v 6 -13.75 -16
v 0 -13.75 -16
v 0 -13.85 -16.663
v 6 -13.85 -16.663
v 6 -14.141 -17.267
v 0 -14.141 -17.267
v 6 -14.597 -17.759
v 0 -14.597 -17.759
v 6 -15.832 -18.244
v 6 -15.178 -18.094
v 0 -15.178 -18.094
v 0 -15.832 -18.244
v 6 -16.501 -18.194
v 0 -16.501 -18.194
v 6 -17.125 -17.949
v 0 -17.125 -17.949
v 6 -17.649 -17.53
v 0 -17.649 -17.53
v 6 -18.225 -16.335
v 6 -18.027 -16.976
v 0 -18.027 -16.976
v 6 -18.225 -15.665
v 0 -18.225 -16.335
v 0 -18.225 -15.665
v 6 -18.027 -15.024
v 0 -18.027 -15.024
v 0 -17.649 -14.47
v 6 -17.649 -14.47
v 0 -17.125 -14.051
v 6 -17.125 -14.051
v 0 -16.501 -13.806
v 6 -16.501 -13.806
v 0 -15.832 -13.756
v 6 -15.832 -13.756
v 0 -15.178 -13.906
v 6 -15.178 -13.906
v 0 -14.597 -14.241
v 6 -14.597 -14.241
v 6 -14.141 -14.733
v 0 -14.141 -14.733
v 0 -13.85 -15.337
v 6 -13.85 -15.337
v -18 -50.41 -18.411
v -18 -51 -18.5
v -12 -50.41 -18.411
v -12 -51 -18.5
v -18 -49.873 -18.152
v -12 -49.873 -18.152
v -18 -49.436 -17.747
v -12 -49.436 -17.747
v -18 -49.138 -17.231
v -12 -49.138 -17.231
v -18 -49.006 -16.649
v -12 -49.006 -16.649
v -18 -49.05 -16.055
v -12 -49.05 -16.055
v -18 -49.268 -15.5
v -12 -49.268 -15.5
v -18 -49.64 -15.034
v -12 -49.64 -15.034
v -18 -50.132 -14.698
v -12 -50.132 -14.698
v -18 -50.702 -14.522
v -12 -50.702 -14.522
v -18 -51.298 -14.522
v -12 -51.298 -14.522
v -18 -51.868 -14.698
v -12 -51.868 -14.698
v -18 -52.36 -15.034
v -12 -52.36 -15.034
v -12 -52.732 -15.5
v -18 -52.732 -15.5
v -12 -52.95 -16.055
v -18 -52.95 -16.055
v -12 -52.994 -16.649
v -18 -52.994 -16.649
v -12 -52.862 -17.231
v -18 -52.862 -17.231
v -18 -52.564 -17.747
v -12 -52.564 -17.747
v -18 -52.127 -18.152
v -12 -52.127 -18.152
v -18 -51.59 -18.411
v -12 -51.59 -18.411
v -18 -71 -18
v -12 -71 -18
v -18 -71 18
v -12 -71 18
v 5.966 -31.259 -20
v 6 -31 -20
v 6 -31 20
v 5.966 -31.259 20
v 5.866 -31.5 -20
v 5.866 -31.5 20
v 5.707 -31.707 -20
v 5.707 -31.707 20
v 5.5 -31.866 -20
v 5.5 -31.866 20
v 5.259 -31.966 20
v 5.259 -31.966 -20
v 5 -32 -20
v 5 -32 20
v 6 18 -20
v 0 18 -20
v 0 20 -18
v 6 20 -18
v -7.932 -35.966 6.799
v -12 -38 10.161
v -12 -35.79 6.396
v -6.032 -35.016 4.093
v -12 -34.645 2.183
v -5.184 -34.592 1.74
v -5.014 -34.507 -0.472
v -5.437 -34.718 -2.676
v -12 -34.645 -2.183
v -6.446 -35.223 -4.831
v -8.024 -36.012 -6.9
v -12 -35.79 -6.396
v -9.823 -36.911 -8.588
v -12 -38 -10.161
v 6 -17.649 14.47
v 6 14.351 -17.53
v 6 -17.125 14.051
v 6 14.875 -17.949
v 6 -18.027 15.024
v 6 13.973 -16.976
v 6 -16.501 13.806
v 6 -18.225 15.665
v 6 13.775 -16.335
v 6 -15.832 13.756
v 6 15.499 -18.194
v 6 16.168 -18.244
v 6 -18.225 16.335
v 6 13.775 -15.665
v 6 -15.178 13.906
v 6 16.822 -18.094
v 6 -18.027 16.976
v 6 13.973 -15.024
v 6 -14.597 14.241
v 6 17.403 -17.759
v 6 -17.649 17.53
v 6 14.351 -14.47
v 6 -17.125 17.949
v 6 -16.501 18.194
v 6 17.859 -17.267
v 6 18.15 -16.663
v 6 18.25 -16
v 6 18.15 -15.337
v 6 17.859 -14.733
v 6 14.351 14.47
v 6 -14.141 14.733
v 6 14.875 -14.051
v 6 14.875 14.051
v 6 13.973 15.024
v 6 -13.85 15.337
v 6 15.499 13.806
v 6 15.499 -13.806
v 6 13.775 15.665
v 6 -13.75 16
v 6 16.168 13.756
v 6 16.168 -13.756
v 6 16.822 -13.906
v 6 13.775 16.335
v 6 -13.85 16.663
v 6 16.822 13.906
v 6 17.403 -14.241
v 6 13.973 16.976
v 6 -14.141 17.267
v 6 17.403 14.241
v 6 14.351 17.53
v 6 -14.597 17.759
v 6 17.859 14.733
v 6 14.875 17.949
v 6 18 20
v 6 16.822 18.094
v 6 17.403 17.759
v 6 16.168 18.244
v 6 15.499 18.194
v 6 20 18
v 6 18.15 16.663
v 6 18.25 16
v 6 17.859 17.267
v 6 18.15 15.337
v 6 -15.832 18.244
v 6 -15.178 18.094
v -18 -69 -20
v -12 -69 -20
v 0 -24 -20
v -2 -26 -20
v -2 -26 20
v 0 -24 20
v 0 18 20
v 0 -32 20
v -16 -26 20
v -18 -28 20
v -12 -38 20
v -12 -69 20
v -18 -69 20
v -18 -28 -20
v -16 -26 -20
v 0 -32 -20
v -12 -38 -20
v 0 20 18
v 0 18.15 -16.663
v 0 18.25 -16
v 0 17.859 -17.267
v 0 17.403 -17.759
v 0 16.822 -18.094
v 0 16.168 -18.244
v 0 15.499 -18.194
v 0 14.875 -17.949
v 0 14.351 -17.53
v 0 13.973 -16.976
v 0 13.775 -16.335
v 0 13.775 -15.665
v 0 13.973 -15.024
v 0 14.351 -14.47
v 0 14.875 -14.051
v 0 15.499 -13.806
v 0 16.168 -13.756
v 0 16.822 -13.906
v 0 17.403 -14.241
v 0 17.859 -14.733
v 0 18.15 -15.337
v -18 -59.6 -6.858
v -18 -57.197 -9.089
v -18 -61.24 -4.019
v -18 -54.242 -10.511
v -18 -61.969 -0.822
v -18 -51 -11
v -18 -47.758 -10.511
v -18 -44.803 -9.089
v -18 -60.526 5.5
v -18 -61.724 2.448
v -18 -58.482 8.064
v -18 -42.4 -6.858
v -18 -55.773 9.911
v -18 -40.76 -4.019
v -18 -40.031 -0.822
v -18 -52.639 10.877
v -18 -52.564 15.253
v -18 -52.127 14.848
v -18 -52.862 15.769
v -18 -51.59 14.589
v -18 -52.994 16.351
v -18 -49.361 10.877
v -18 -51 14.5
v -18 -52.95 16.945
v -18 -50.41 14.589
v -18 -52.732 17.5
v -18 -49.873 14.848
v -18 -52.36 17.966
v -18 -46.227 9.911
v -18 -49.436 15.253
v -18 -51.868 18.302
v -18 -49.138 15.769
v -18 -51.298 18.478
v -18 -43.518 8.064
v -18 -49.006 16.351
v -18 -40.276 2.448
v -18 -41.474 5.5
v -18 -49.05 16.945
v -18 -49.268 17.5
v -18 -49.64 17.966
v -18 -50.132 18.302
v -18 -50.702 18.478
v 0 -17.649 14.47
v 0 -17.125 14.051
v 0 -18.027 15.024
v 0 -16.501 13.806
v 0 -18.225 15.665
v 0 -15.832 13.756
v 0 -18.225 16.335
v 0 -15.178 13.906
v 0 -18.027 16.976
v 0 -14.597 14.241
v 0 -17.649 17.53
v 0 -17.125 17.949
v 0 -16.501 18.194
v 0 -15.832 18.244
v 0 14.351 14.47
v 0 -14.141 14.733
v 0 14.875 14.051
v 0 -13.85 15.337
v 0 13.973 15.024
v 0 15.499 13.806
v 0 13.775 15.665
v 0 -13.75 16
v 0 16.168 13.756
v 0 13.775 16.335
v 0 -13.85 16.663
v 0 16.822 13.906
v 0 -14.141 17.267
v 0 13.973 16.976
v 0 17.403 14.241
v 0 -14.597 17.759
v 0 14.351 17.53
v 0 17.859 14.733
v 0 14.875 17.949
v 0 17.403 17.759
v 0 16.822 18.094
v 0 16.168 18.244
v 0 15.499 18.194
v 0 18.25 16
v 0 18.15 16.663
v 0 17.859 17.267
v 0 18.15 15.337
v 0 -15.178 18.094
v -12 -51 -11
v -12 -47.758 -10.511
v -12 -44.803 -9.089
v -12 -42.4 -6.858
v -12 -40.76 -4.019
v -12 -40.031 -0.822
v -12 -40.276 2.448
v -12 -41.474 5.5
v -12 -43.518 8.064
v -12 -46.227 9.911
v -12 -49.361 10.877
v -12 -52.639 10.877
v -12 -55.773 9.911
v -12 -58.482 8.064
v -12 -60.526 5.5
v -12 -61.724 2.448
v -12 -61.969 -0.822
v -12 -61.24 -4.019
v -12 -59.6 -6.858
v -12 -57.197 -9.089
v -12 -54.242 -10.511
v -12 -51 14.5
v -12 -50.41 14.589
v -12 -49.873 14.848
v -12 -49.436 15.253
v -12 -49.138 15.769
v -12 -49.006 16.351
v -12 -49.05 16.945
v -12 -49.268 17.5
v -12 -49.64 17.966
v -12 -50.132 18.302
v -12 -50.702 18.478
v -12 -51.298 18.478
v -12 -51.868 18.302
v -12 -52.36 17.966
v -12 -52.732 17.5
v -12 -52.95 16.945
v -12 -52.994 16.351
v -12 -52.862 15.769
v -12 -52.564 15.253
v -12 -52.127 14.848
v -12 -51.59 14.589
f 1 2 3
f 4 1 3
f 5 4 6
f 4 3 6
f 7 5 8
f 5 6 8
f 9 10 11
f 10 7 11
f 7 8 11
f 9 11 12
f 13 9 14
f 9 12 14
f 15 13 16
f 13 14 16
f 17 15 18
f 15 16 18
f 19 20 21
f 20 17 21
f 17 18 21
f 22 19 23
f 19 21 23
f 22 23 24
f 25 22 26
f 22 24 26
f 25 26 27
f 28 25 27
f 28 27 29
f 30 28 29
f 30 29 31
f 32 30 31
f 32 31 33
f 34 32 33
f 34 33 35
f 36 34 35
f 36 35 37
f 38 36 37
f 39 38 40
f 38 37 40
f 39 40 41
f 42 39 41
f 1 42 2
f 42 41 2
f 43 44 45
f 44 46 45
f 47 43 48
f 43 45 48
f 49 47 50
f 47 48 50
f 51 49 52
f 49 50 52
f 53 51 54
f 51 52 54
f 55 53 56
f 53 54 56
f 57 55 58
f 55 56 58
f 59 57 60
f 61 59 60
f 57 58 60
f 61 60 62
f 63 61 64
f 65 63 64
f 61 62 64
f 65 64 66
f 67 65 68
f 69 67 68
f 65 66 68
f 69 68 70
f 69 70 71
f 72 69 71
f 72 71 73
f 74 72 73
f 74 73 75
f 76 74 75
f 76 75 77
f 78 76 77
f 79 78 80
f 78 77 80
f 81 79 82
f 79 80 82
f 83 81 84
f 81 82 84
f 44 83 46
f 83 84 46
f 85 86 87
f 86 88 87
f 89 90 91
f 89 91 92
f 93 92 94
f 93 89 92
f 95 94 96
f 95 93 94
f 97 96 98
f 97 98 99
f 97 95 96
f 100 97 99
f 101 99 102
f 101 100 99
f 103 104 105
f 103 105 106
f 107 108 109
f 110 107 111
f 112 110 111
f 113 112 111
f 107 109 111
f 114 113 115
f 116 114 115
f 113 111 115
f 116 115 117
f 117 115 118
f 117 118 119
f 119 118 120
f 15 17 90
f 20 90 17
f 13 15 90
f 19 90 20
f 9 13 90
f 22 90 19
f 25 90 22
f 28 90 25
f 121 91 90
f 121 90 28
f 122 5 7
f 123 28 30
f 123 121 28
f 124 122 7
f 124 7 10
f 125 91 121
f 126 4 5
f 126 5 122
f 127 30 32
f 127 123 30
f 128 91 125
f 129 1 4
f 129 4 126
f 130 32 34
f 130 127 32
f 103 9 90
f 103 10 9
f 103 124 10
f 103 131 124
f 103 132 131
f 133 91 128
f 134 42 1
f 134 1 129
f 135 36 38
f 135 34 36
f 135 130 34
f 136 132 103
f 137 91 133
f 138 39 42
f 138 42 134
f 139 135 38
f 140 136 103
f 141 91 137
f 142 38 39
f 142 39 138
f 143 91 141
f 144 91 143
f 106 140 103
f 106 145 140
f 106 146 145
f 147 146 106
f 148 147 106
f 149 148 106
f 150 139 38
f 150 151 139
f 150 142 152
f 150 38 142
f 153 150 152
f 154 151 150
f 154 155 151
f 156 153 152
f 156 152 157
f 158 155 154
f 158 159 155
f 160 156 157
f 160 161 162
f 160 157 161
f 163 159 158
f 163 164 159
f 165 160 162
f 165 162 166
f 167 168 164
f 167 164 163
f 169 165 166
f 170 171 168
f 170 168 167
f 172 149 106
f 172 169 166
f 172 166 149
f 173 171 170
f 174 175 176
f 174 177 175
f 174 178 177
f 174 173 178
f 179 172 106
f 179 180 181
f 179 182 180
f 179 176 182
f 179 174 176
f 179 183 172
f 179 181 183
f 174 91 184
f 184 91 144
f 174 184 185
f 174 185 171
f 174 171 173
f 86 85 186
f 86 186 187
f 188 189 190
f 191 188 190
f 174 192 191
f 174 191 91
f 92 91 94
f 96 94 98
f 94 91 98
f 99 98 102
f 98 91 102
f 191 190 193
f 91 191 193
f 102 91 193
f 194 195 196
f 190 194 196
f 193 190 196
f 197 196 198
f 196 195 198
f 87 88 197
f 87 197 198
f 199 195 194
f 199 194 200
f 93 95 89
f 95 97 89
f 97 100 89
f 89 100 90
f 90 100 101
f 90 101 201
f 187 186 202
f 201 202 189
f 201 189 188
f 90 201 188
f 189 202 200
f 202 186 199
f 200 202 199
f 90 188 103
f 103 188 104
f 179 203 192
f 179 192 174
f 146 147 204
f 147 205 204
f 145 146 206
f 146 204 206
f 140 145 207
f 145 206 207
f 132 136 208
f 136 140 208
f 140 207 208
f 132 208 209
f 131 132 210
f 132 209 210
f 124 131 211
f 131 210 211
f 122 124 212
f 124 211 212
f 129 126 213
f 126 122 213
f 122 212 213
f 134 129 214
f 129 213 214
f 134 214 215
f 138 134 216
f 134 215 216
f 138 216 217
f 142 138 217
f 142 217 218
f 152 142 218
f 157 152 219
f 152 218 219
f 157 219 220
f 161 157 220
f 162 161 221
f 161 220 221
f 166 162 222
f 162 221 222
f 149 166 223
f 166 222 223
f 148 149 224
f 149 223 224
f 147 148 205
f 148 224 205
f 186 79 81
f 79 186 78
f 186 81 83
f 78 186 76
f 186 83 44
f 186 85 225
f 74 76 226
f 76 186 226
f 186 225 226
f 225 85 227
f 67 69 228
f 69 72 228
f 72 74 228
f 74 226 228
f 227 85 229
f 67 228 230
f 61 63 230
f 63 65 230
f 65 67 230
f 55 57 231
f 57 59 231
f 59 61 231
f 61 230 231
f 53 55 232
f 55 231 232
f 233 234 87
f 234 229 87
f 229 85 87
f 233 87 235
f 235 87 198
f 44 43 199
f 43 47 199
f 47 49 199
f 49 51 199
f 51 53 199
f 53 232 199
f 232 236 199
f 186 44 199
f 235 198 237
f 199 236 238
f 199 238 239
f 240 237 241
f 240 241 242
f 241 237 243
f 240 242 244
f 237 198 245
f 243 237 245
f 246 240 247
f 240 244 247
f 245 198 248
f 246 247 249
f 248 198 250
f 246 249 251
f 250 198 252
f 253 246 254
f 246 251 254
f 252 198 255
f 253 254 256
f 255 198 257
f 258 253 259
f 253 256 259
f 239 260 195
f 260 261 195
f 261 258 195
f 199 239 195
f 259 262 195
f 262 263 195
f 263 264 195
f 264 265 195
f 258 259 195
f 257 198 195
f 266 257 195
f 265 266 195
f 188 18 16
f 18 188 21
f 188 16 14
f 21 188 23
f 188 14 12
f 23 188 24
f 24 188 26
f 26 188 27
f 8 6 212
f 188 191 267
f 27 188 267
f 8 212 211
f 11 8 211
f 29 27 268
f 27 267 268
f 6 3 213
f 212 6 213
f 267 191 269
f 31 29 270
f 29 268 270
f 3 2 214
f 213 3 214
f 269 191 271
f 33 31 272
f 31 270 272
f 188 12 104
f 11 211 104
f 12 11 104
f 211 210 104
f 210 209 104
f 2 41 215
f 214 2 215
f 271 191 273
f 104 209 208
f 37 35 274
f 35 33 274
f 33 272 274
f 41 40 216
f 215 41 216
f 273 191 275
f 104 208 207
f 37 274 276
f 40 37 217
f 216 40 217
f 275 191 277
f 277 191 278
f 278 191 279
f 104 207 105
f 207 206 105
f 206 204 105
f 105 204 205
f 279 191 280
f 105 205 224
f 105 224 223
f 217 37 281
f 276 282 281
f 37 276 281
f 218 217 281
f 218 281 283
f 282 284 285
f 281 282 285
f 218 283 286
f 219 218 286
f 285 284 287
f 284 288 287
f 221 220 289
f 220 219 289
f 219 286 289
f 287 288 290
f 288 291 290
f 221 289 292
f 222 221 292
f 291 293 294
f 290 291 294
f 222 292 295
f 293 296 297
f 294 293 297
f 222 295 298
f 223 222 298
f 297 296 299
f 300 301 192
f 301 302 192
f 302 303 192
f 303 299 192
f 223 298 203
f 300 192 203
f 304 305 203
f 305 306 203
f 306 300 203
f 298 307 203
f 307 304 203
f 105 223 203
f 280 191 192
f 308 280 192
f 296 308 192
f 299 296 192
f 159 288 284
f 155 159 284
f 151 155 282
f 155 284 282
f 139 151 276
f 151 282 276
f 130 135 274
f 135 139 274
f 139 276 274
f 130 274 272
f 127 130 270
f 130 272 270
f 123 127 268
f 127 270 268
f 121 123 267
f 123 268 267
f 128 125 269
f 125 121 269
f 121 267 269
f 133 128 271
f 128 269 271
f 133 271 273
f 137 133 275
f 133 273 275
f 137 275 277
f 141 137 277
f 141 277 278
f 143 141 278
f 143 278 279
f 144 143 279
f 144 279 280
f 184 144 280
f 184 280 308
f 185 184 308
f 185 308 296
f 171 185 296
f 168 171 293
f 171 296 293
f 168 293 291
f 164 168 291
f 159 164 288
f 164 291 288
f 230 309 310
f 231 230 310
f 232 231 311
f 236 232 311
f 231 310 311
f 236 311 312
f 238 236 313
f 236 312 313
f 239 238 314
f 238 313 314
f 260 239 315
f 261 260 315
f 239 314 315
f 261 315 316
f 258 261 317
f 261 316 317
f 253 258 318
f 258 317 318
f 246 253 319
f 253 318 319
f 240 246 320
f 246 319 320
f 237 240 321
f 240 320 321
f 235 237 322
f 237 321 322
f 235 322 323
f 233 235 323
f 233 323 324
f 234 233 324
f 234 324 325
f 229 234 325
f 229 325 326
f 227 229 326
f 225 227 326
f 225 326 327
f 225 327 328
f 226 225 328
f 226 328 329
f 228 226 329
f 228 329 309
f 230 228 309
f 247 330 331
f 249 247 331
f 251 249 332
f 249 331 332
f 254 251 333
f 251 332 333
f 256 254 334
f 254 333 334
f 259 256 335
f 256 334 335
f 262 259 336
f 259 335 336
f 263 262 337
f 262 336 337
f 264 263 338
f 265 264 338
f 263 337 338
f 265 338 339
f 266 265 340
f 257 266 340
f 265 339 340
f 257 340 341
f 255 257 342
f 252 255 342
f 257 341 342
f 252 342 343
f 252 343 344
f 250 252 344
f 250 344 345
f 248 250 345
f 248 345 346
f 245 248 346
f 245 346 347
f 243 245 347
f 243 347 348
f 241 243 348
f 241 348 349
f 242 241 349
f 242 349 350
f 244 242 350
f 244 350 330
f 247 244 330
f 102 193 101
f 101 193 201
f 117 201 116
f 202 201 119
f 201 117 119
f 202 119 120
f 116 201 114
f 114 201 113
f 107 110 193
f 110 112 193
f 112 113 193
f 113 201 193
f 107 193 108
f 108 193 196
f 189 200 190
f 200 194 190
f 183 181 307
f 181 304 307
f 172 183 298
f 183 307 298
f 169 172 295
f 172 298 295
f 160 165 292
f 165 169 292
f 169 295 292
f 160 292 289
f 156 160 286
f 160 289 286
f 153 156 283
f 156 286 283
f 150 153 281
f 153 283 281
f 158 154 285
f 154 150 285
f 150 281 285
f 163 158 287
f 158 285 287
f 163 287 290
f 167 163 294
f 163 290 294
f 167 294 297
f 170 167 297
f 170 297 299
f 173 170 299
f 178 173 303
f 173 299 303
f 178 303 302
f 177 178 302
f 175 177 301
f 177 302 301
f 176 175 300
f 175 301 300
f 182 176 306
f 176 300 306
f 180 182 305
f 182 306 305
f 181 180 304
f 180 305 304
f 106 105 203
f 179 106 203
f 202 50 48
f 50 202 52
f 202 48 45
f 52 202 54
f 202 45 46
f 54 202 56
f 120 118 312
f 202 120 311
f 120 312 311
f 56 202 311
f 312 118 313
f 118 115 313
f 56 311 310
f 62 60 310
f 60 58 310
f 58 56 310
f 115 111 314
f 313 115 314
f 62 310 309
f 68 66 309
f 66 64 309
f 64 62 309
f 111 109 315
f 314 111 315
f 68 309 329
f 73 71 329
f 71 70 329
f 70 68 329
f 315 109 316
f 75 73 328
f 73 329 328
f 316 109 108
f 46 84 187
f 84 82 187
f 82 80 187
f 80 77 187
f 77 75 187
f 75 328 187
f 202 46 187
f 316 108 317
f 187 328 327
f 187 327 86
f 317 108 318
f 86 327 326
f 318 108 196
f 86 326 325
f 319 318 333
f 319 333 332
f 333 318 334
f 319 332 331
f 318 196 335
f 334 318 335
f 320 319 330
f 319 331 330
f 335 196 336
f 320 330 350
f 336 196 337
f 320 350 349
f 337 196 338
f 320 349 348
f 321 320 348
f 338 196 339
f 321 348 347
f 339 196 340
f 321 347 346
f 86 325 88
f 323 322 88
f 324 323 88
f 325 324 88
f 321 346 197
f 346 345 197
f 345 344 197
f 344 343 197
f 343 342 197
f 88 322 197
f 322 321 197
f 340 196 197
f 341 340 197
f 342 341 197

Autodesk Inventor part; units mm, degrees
ref_plane "YZ Plane" through (0, 0, 0) normal (1, 0, 0) x (0, 1, 0)
ref_plane "XZ Plane" through (0, 0, 0) normal (0, 1, 0) x (-1, 0, 0)
ref_plane "XY Plane" through (0, 0, 0) normal (0, 0, 1) x (1, 0, 0)
sketch "Skizze1" plane through (0, 0, 0) normal (1, 0, 0) x (0, 1, 0)
  line L0 (-20, -20) -> (20, -20)
  line L1 (20, -20) -> (20, 20)
  line L2 (20, 20) -> (-20, 20)
  line L3 (-20, 20) -> (-20, -20)
  line L4 (-20, -20) -> (20, 20) construction
  line L5 (20, -20) -> (-20, 20) construction
  line L6 (-16, -16) -> (16, -16) construction
  line L7 (16, -16) -> (16, 16) construction
  line L8 (16, 16) -> (-16, 16) construction
  line L9 (-16, 16) -> (-16, -16) construction
  line L10 (-16, -16) -> (16, 16) construction
  line L11 (16, -16) -> (-16, 16) construction
  circle A0 centre (16, 16) radius 2.25
  circle A1 centre (16, -16) radius 2.25
  circle A2 centre (-16, -16) radius 2.25
  circle A3 centre (-16, 16) radius 2.25
  line L12 (-20, 20) -> (-32, 20)
  line L13 (-32, 20) -> (-32, -20)
  line L14 (-32, -20) -> (-20, -20)
  line L15 (-20, -20) -> (-20, 20)
  point P0 (0, 0)
  dimension "d0" = 40
  dimension "d1" = 40
  dimension "d2" = 32
  dimension "d3" = 32
  dimension "d4" = 4.5
  dimension "d5" = 4.5
  dimension "d6" = 4.5
  dimension "d7" = 4.5
  dimension "d8" = 12
extrude "Extrusion1" add sketch "Skizze1" along normal blind 6
ref_plane "Arbeitsebene1" through (0, -32, 20) normal (0, 0, 1) x (1, 0, 0)
sketch "Skizze2" plane through (0, -32, 20) normal (0, 0, 1) x (1, 0, 0)
  line L0 (0, 52) -> (0, 0) projected
  line L1 (0, 0) -> (6, 0) projected
  line L2 (6, 52) -> (6, 0) projected
  line L3 (0, 52) -> (6, 52) projected
  line L4 (-18, 6) -> (-12, 6)
  line L5 (-12, 6) -> (-12, -39)
  line L6 (-12, -39) -> (-18, -39)
  line L7 (-18, -39) -> (-18, 6)
  line L8 (0, 0) -> (-12, -6)
  line L9 (-12, 6) -> (0, 6)
  point P0 (0, 32)
  point P1 (-15, -39)
  point P2 (-15, 6)
  dimension "d12" = 6
  dimension "d13" = 45
  dimension "d14" = 6
  dimension "d15" = 12
  dimension "d16" = 12
extrude "Extrusion2" add sketch "Skizze2" against normal up to surface (40 mm away) contours L0 L8 L5 L9 | L5 L6 L7 L4
chamfer "Fasen1" distance 2 angle 45 6 edges at (-18, -26, 0) (0, -26, 0) (-15, -71, -20) (-15, -71, 20) (3, 20, -20) (3, 20, 20)
sketch "Skizze3" plane through (-12, -38, 20) normal (1, 0, 0) x (0, 0, -1)
  line L0 (2, -33) -> (0, -31) projected
  line L1 (2, -33) -> (38, -33) projected
  line L2 (40, -31) -> (38, -33) projected
  line L3 (40, 0) -> (40, -31) projected
  line L4 (0, 0) -> (40, 0) projected
  line L5 (0, -31) -> (0, 0) projected
  circle A0 centre (20, -13) radius 20
  circle A1 centre (20, -13) radius 16.5
  point P0 (20, 38)
  dimension "d22" = 33
extrude "Extrusion3" cut sketch "Skizze3" along normal through all contours A1 L4 | L4 A1
sketch "Skizze4" plane through (-12, -69, 20) normal (1, 0, 0) x (0, 0, -1)
  line L0 (0, 31) -> (9.8388, 31) projected
  line L1 (0, 0) -> (0, 31) projected
  line L2 (2, -2) -> (0, 0) projected
  line L3 (2, -2) -> (38, -2) projected
  line L4 (40, 0) -> (38, -2) projected
  line L5 (40, 31) -> (40, 0) projected
  line L6 (30.1612, 31) -> (40, 31) projected
  arc A0 (30.1612, 31) -> (9.8388, 31) centre (20, 18) ccw projected
  circle A1 centre (20, 18) radius 16.5
  circle A2 centre (3.5, 18) radius 2
  circle A3 centre (36.5, 18) radius 2
  point P0 (20, 69)
  dimension "d25" = 4
  dimension "d26" = 4
extrude "Extrusion4" cut sketch "Skizze4" against normal blind 10 contours A2 A1 | A1 A2 | A3 A1 | A1 A3
sketch "Skizze5" plane through (-12, -69, 20) normal (1, 0, 0) x (0, 0, -1)
  arc A0 (30.1612, 31) -> (9.8388, 31) centre (20, 18) ccw projected
  line L0 (0, 37) -> (40, 37) projected
  line L1 (0, 31) -> (0, 37) projected
  line L2 (0, 31) -> (9.8388, 31) projected
  circle A1 centre (20, 18) radius 11
  line L3 (30.1612, 31) -> (40, 31) projected
  line L4 (40, 37) -> (40, 31) projected
  point P0 (20, 69)
  dimension "d29" = 22
extrude "Extrusion5" cut sketch "Skizze5" against normal blind 10 contours A1
fillet "Rundung1" radius 1 1 edges at (6, -32, 0)
properties part number "40_XYZstage_micrometer_motorized_nema8_samplemount_lightsheet_screwed"
